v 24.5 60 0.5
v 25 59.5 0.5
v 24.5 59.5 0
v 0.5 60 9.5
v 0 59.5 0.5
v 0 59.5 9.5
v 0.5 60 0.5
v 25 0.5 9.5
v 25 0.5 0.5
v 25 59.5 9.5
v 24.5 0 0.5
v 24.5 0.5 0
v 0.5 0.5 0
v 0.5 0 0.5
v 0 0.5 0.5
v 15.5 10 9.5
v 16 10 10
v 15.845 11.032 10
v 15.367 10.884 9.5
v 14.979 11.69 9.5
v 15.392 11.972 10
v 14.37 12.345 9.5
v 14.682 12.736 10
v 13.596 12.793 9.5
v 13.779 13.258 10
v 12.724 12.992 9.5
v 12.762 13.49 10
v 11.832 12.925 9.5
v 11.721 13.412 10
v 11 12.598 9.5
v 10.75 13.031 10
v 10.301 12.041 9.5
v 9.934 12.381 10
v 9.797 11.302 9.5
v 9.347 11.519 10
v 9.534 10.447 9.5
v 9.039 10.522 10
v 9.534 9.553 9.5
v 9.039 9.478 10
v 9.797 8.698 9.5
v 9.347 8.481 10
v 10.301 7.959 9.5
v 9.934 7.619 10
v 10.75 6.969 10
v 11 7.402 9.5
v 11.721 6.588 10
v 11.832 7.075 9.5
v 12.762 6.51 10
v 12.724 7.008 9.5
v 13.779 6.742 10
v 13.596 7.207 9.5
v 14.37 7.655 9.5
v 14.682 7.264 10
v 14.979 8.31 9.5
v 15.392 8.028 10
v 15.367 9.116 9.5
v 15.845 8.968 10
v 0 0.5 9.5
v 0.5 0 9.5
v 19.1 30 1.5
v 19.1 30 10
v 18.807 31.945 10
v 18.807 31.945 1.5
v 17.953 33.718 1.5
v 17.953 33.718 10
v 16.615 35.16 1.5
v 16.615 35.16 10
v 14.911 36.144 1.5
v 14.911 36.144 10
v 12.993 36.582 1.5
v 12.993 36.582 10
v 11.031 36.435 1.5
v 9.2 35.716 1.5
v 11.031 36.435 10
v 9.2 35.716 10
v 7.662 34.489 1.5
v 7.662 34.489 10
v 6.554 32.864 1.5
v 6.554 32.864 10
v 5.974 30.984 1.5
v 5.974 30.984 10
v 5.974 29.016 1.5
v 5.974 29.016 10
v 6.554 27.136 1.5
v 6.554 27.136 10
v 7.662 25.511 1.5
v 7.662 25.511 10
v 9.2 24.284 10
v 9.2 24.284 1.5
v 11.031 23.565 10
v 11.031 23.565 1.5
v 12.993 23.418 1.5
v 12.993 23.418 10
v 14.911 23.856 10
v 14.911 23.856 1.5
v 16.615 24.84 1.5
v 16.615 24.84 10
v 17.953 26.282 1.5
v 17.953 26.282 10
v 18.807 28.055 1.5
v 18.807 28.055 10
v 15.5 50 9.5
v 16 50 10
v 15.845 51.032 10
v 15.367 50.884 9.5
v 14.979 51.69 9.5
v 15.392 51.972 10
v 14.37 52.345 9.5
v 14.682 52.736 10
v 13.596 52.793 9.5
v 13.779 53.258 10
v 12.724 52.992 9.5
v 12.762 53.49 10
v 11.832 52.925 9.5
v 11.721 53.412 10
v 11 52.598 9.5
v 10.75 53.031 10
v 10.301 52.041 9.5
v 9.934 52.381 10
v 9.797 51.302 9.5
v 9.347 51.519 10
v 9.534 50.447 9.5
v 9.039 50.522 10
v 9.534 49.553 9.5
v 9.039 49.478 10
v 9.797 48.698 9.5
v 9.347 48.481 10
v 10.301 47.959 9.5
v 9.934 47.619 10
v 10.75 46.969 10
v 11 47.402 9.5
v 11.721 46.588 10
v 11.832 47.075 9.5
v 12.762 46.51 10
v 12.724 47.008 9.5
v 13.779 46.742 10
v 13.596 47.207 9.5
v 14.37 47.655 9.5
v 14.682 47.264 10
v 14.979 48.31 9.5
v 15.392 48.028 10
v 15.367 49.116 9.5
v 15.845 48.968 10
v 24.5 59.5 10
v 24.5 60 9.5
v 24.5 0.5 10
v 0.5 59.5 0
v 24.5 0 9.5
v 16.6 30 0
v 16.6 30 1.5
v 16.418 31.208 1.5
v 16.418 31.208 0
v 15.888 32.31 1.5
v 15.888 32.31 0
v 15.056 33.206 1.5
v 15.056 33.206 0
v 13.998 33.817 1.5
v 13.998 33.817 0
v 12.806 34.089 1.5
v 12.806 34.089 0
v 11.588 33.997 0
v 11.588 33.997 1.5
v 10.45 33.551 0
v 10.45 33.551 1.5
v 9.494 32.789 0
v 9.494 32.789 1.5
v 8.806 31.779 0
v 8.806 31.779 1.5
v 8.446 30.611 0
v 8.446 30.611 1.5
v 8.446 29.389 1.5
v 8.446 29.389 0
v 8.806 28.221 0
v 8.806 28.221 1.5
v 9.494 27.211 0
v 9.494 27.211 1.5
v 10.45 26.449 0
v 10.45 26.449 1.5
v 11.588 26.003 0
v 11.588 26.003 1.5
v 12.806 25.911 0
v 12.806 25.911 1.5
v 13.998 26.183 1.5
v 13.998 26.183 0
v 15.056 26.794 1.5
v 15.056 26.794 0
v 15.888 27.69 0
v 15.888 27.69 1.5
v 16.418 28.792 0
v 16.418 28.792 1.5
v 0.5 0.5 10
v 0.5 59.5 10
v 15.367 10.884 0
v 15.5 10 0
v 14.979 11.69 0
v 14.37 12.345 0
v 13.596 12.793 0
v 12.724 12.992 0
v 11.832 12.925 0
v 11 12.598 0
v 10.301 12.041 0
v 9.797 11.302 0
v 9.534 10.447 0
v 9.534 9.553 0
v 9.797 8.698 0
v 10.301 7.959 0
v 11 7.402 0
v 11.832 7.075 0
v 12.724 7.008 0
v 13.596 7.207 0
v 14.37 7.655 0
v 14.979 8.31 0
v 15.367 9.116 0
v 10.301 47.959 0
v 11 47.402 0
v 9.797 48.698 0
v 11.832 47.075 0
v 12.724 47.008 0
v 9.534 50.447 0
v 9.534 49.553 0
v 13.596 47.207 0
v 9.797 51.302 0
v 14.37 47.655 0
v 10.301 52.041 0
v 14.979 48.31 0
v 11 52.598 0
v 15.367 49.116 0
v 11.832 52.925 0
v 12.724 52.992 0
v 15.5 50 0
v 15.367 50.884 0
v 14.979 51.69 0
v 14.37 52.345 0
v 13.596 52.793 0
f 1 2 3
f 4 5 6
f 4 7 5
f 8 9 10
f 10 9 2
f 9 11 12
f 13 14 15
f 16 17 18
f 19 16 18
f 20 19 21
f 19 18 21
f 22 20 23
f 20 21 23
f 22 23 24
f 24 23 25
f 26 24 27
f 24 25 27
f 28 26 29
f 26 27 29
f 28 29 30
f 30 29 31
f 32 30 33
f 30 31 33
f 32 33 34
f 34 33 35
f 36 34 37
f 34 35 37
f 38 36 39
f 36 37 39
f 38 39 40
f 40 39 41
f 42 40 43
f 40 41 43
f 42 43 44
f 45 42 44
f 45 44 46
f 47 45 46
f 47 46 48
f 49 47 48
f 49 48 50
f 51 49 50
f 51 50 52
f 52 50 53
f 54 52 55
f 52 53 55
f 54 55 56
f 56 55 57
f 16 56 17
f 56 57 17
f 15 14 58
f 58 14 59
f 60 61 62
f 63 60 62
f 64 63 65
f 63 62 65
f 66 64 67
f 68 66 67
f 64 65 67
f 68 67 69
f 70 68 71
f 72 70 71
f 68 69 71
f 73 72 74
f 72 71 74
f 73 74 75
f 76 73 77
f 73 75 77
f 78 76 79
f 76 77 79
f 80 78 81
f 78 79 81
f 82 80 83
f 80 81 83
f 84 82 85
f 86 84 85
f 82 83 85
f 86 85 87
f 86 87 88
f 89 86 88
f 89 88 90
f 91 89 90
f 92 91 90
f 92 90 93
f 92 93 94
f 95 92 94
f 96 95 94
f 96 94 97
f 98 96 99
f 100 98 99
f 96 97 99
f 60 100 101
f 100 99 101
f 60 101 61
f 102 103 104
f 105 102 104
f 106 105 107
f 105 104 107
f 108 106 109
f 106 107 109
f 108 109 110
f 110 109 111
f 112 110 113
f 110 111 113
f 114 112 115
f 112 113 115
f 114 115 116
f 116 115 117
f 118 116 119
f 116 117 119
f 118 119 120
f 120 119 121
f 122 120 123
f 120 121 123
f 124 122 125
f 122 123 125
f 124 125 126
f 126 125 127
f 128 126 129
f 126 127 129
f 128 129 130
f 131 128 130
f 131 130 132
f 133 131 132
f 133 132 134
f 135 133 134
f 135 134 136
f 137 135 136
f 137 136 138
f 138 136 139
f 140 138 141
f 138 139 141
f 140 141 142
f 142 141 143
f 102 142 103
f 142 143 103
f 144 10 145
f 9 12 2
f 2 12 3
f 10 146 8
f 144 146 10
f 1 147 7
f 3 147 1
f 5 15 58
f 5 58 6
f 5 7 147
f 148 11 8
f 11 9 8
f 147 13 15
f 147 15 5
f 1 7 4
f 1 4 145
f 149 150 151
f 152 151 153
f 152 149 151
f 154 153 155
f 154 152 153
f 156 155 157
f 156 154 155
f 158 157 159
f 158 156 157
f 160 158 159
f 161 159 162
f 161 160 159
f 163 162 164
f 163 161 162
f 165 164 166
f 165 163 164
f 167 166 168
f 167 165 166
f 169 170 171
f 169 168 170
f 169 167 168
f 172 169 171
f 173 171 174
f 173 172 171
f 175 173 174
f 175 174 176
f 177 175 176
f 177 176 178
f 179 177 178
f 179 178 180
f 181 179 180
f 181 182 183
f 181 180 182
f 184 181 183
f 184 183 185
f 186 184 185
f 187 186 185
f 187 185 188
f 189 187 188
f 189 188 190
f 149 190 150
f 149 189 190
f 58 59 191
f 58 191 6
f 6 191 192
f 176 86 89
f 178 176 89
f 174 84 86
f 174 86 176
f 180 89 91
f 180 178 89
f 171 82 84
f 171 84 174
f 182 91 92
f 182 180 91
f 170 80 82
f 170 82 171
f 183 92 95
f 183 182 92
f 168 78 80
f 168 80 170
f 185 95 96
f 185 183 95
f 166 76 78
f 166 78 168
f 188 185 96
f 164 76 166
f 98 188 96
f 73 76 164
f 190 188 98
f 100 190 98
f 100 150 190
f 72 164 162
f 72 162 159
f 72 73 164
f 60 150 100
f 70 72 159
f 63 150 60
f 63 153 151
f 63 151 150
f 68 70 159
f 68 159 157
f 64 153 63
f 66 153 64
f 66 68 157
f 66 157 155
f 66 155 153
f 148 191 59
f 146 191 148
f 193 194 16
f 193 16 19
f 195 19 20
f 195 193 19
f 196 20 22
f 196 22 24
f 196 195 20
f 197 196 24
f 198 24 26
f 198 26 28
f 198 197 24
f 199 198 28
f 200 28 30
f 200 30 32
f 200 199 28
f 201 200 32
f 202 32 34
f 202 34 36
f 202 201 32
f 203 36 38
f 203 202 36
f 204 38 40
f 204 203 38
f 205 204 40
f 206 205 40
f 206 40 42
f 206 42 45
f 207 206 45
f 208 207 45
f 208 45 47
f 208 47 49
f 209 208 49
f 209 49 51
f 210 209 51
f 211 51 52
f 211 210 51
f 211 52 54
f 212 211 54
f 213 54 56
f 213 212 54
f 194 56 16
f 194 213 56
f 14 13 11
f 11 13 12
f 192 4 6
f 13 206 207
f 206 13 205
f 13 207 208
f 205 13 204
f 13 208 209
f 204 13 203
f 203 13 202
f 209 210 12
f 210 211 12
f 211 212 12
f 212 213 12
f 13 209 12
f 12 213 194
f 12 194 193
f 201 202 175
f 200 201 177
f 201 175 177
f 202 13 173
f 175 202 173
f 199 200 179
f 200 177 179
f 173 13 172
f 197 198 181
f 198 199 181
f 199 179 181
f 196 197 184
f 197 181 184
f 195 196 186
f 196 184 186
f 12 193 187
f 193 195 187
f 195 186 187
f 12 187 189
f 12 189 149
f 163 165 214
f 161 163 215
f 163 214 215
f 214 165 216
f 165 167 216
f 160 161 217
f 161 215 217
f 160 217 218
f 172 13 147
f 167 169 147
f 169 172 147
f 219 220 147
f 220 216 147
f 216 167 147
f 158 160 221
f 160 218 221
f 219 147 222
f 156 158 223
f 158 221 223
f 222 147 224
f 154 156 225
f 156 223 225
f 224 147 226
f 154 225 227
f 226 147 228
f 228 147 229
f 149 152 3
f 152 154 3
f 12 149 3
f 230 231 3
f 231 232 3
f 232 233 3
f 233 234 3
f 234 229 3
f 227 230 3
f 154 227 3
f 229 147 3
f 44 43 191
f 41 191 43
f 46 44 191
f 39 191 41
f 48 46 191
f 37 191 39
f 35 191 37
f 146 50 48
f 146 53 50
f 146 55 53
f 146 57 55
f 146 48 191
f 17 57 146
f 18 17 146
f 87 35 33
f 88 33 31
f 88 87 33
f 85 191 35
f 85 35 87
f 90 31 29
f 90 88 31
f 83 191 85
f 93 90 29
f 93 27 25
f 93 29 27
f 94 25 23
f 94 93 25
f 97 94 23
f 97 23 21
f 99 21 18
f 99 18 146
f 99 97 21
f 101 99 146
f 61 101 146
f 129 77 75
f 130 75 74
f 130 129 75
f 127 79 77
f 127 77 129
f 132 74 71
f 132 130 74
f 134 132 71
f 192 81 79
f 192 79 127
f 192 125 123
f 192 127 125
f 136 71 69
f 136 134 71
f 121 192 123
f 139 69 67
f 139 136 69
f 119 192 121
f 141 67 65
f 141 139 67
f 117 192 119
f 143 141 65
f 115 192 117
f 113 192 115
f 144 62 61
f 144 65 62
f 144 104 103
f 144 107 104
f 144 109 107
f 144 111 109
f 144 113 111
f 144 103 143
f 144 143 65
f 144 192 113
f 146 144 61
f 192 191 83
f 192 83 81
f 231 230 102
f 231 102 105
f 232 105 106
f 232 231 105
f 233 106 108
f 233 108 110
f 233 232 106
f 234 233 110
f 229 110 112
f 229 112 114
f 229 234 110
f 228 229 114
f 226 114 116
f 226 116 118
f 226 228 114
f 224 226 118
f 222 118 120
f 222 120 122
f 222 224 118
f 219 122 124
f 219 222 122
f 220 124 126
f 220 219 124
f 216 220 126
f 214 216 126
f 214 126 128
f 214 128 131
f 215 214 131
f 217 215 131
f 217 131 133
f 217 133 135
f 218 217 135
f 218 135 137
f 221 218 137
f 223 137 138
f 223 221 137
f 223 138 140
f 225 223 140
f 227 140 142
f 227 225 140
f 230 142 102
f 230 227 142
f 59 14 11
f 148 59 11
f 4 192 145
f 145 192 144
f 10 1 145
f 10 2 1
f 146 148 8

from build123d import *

# Parameters (mm, degrees)
ESQUISSE1_W             = 25
ESQUISSE1_H             = 60
ESQUISSE1_R             = 3
ESQUISSE1_R_2           = 4.1
BASE_EXTRUSION_DEPTH    = 10
CHANFREIN1_SIZE         = 0.5
ESQUISSE2_R             = 6.6
ENL_V_MAT_EXTRU_1_DEPTH = 8.5


with BuildPart() as part:
    # Esquisse1 → Base-Extrusion (new body)
    with BuildSketch(Plane.XY):
        with Locations((12.5, 30)):
            Rectangle(ESQUISSE1_W, ESQUISSE1_H)
        with Locations((12.5, 50)):
            Circle(ESQUISSE1_R, mode=Mode.SUBTRACT)
        with Locations((12.5, 10)):
            Circle(ESQUISSE1_R, mode=Mode.SUBTRACT)
        with Locations((12.5, 30)):
            Circle(ESQUISSE1_R_2, mode=Mode.SUBTRACT)
    extrude(amount=BASE_EXTRUSION_DEPTH)

    # Chanfrein1
    chanfrein1_edges = [part.edges().sort_by_distance(p)[0] for p in [
        (0, 0, 5),
        (25, 0, 5),
        (12.5, 0, 0),
        (12.5, 0, 10),
        (25, 60, 5),
        (25, 30, 0),
        (25, 30, 10),
        (0, 60, 5),
        (12.5, 60, 0),
        (12.5, 60, 10),
        (0, 30, 0),
        (0, 30, 10),
        (9.5, 50, 10),
        (9.5, 10, 10),
    ]]
    chamfer(chanfrein1_edges, length=CHANFREIN1_SIZE)

    # Esquisse2 → Enlèv. mat.-Extru.1 (cut)
    with BuildSketch(Plane.XY.offset(10)):
        with Locations((12.5, 30)):
            Circle(ESQUISSE2_R)
    extrude(amount=-ENL_V_MAT_EXTRU_1_DEPTH, mode=Mode.SUBTRACT)


solid = part.part
